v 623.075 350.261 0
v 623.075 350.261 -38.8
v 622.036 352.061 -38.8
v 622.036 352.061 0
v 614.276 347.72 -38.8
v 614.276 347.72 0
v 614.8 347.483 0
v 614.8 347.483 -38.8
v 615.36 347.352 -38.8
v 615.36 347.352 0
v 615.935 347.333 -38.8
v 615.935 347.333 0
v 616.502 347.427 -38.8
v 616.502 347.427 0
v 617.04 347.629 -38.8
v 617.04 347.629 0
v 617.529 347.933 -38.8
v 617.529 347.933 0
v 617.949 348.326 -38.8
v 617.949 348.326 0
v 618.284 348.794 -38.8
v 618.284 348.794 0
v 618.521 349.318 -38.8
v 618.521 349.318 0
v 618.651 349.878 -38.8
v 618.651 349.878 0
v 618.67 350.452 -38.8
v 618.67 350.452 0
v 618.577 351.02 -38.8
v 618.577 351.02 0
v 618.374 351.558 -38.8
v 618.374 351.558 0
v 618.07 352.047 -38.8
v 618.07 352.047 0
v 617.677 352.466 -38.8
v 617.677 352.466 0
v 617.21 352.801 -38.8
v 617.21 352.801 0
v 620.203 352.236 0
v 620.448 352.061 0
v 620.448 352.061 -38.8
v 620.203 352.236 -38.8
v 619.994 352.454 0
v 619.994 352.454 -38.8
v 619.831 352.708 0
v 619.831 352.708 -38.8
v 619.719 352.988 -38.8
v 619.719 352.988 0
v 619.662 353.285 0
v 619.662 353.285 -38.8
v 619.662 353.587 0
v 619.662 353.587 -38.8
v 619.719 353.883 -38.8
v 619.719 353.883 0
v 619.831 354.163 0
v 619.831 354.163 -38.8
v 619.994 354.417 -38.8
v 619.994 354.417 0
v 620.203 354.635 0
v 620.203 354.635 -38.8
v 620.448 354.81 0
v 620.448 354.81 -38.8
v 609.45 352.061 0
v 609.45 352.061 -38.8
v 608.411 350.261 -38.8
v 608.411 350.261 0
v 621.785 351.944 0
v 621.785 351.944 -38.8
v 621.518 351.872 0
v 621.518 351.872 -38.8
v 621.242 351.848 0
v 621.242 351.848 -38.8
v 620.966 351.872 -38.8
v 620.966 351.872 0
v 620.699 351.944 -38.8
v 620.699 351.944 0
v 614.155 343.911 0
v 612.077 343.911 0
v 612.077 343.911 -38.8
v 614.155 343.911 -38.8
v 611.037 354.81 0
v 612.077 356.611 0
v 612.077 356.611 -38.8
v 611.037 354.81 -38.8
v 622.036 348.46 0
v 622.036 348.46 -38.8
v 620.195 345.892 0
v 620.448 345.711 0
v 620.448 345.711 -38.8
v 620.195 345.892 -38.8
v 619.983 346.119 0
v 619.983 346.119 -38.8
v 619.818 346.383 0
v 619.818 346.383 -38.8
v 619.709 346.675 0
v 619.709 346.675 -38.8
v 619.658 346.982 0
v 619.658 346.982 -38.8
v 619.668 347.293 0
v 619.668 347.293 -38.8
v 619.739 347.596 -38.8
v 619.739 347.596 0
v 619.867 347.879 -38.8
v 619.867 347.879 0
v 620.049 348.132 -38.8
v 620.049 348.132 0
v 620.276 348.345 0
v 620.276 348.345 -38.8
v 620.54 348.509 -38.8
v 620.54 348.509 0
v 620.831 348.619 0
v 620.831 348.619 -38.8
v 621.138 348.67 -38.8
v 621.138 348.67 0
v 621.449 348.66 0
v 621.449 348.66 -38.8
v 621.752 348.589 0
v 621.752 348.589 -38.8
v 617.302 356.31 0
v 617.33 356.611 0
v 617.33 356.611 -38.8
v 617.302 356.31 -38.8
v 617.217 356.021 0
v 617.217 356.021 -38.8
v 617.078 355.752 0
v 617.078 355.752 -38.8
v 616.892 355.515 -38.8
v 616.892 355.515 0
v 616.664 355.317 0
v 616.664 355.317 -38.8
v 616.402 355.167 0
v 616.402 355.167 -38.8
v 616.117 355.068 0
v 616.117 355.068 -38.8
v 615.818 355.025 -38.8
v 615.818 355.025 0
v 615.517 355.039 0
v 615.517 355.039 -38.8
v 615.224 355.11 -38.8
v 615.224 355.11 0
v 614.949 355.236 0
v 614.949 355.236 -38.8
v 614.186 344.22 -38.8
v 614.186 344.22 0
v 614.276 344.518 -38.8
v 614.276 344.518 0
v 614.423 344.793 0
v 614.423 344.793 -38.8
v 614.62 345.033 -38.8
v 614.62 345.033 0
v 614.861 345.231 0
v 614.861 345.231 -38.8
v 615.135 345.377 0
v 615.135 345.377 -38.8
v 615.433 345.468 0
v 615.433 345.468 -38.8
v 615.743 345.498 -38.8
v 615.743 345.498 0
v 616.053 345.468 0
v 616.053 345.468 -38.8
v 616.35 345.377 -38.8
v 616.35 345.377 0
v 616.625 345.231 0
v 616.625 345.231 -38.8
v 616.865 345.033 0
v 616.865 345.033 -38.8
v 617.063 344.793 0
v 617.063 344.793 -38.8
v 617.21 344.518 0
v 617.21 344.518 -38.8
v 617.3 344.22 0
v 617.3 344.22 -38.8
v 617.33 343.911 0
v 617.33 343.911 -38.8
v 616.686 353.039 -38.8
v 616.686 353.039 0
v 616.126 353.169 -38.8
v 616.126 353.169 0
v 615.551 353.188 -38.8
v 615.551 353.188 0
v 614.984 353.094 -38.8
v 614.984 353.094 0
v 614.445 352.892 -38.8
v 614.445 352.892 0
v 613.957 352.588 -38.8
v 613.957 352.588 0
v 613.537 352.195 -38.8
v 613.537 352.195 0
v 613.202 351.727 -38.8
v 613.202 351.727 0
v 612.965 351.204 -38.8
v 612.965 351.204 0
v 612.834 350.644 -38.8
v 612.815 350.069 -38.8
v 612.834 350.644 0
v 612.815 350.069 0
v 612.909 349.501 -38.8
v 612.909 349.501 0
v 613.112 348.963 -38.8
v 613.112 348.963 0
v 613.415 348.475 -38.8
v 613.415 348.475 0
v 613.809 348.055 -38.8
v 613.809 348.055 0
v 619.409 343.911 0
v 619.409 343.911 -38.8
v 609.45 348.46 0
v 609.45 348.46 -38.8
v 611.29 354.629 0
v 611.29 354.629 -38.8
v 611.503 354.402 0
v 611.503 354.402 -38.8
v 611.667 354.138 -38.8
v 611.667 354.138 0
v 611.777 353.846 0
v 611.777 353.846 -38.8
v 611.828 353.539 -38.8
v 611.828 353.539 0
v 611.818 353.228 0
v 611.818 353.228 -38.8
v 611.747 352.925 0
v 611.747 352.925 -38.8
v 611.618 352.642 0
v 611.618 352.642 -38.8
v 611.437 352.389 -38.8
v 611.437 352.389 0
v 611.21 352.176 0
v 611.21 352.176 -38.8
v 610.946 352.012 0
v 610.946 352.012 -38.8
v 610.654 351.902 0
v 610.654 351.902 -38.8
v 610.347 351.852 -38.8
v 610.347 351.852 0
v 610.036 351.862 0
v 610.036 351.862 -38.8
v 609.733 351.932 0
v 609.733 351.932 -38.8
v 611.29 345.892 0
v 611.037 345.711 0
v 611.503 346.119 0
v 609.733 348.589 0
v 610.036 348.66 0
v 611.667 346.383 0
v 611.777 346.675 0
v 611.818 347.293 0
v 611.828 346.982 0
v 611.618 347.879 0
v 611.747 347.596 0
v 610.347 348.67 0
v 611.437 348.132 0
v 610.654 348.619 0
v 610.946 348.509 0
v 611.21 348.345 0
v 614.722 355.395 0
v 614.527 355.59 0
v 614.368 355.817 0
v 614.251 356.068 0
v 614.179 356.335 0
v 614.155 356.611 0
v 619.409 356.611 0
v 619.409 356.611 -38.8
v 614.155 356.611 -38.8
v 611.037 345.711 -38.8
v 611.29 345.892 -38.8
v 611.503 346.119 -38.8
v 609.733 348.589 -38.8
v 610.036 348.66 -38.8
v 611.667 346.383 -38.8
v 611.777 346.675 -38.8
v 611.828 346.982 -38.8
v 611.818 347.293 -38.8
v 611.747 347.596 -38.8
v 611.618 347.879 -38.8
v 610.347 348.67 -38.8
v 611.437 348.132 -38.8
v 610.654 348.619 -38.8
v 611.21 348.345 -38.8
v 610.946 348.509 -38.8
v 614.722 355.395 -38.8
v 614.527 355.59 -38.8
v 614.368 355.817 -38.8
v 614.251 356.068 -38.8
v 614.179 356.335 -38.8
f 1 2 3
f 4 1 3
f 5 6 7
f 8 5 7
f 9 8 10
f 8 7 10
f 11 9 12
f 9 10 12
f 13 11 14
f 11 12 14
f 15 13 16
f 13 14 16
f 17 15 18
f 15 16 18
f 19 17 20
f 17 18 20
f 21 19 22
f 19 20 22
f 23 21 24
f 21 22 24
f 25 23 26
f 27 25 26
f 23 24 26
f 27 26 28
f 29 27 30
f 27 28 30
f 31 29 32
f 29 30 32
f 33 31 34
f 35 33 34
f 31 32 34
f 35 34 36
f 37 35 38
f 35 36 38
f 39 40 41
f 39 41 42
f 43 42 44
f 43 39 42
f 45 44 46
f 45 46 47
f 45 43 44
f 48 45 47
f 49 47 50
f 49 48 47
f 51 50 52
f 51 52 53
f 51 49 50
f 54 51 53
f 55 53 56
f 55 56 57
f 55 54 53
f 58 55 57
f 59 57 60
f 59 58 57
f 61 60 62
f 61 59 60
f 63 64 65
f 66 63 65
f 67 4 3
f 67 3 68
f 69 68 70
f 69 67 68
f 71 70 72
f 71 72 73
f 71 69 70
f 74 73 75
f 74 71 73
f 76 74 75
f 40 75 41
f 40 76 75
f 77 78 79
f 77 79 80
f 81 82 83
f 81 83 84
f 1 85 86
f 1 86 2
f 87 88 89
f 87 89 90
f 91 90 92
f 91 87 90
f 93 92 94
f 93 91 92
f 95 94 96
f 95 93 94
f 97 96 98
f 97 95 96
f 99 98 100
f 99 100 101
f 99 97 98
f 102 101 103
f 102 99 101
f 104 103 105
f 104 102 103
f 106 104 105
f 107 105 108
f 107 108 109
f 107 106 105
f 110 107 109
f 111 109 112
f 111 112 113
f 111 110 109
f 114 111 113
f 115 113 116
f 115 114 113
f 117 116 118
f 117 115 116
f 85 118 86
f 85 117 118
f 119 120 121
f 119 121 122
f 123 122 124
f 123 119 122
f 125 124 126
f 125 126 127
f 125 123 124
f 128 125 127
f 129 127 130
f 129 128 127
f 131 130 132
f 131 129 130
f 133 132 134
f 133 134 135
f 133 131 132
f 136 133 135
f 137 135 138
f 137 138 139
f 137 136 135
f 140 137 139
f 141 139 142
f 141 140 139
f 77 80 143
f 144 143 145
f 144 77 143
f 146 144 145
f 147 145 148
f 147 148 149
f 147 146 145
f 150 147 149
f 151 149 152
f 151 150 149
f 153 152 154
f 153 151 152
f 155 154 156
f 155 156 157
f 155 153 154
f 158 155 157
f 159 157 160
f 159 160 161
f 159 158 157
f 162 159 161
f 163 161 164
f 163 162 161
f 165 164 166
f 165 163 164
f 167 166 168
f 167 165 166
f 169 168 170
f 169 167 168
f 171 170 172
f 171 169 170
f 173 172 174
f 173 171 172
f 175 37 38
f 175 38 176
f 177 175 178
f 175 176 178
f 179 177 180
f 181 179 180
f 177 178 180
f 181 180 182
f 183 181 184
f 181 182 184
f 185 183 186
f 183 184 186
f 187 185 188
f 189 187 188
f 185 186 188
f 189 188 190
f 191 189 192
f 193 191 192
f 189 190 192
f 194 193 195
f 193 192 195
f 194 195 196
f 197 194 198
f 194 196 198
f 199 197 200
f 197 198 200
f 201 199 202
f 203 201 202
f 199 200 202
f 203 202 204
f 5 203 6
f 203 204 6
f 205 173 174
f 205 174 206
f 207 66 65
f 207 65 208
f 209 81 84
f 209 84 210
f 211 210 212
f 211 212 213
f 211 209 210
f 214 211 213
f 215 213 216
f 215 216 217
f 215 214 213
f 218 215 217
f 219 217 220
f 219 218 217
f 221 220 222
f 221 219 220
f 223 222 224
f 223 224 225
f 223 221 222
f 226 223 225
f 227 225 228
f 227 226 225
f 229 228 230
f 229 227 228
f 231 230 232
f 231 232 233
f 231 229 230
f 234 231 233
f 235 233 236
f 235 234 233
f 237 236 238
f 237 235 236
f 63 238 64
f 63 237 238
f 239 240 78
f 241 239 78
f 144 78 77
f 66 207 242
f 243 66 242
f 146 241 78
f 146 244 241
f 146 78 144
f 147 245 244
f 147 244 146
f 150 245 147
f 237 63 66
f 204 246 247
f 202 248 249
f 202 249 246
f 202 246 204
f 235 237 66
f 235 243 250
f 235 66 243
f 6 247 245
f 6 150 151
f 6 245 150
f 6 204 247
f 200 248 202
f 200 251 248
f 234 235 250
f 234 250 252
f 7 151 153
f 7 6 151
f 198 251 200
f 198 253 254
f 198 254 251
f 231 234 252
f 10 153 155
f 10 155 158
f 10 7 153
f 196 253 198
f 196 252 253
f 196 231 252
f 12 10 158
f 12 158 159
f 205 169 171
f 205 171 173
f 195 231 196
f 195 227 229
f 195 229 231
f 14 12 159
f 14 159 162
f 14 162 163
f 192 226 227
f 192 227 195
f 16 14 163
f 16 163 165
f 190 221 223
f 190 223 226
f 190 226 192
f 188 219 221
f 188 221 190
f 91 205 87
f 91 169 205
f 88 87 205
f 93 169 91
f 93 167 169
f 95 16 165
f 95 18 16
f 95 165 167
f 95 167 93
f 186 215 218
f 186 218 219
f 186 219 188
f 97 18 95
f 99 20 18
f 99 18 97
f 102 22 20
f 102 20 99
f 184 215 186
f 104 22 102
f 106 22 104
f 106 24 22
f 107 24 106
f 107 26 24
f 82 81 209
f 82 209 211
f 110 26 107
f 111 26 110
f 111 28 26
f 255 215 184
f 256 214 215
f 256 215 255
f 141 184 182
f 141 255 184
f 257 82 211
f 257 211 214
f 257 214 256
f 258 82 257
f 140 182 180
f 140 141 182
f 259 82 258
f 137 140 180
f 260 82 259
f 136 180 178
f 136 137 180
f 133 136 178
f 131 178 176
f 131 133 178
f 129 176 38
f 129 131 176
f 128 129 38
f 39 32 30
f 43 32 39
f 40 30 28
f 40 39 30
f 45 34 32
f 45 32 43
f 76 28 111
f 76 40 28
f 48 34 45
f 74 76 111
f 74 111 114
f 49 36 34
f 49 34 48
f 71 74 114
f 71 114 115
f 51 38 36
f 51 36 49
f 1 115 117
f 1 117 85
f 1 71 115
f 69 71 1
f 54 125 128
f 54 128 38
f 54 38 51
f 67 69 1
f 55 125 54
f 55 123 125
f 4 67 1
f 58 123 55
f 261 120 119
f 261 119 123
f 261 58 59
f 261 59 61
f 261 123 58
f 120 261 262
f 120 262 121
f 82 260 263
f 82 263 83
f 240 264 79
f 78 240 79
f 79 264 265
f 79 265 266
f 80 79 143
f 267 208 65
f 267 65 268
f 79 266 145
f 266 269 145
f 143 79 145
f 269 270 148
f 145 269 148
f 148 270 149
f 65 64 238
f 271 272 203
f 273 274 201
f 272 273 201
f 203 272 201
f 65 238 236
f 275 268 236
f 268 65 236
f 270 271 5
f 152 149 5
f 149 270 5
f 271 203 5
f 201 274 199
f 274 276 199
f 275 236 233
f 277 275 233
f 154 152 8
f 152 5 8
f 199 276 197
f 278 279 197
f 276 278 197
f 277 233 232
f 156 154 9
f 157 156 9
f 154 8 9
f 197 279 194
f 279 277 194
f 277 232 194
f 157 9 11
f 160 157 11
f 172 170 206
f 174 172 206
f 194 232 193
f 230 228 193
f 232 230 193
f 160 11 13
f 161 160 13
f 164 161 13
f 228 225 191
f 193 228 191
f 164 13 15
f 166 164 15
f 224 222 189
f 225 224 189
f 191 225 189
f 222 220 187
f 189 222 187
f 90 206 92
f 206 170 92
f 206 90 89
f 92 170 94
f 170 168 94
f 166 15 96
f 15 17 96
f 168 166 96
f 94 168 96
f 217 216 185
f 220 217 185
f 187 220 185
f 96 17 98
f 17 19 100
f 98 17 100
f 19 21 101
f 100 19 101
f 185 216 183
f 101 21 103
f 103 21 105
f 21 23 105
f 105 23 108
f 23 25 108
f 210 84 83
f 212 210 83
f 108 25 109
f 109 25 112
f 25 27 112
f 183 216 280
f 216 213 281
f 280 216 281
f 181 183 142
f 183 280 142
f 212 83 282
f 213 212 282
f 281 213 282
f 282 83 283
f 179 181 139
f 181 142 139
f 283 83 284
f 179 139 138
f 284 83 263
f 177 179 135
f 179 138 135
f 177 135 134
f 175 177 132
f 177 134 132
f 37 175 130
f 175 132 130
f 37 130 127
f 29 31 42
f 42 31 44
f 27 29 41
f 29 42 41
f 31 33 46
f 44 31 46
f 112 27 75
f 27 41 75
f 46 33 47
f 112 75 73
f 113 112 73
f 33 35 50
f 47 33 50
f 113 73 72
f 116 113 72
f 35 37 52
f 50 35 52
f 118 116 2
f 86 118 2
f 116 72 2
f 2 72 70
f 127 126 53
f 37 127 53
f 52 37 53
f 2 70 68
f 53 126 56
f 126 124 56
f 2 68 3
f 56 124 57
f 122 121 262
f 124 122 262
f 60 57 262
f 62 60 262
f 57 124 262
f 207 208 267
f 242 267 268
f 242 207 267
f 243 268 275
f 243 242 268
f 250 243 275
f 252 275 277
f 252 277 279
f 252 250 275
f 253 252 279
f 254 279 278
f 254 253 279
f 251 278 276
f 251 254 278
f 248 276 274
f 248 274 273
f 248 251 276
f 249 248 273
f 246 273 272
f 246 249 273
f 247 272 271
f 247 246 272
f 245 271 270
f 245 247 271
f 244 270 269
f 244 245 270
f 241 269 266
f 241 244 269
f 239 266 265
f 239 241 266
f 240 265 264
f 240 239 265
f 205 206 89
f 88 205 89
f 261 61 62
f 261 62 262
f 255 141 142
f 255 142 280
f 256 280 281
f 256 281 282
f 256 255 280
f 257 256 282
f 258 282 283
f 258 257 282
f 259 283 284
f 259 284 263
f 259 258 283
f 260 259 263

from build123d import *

# Parameters (mm, degrees)
SALIENTE_EXTRUIR1_DEPTH = 38.8


with BuildPart() as part:
    # Croquis1 → Saliente-Extruir1 (new body)
    with BuildSketch(Plane.XY):
        with BuildLine():
            Line((620.448376311, 354.810426019), (619.409039206, 356.610610691))
            Line((619.409039206, 356.610610691), (617.330364997, 356.610610691))
            ThreePointArc((617.330364997, 356.610610691), (616.536614955, 355.235795338), (614.949114914, 355.23579541))
            ThreePointArc((614.949114914, 355.23579541), (614.368049644, 355.816860732), (614.155364997, 356.610610691))
            Line((614.155364997, 356.610610691), (612.076690788, 356.610610691))
            Line((612.076690788, 356.610610691), (611.037353683, 354.810426019))
            ThreePointArc((611.037353683, 354.810426019), (611.618419011, 352.641860691), (609.449853683, 352.060795362))
            Line((609.449853683, 352.060795362), (608.410516578, 350.260610691))
            Line((608.410516578, 350.260610691), (609.449853683, 348.460426019))
            ThreePointArc((609.449853683, 348.460426019), (611.618419011, 347.879360691), (611.037353683, 345.710795362))
            Line((611.037353683, 345.710795362), (612.076690788, 343.910610691))
            Line((612.076690788, 343.910610691), (614.155364997, 343.910610691))
            ThreePointArc((614.155364997, 343.910610691), (615.742864997, 345.498110691), (617.330364997, 343.910610691))
            Line((617.330364997, 343.910610691), (619.409039206, 343.910610691))
            Line((619.409039206, 343.910610691), (620.448376311, 345.710795362))
            ThreePointArc((620.448376311, 345.710795362), (619.867310982, 347.879360691), (622.035876311, 348.460426019))
            Line((622.035876311, 348.460426019), (623.075213416, 350.260610691))
            Line((623.075213416, 350.260610691), (622.035876311, 352.060795362))
            ThreePointArc((622.035876311, 352.060795362), (621.242126263, 351.848110691), (620.448376228, 352.06079541))
            ThreePointArc((620.448376228, 352.06079541), (619.654626311, 353.435610739), (620.448376311, 354.810426019))
        make_face()
        with BuildLine():
            ThreePointArc((614.276014843, 347.719952052), (618.283523635, 348.793760537), (617.209715151, 352.801269329))
            ThreePointArc((617.209715151, 352.801269329), (613.202206359, 351.727460845), (614.276014843, 347.719952052))
        make_face(mode=Mode.SUBTRACT)
    extrude(amount=-SALIENTE_EXTRUIR1_DEPTH)


solid = part.part
